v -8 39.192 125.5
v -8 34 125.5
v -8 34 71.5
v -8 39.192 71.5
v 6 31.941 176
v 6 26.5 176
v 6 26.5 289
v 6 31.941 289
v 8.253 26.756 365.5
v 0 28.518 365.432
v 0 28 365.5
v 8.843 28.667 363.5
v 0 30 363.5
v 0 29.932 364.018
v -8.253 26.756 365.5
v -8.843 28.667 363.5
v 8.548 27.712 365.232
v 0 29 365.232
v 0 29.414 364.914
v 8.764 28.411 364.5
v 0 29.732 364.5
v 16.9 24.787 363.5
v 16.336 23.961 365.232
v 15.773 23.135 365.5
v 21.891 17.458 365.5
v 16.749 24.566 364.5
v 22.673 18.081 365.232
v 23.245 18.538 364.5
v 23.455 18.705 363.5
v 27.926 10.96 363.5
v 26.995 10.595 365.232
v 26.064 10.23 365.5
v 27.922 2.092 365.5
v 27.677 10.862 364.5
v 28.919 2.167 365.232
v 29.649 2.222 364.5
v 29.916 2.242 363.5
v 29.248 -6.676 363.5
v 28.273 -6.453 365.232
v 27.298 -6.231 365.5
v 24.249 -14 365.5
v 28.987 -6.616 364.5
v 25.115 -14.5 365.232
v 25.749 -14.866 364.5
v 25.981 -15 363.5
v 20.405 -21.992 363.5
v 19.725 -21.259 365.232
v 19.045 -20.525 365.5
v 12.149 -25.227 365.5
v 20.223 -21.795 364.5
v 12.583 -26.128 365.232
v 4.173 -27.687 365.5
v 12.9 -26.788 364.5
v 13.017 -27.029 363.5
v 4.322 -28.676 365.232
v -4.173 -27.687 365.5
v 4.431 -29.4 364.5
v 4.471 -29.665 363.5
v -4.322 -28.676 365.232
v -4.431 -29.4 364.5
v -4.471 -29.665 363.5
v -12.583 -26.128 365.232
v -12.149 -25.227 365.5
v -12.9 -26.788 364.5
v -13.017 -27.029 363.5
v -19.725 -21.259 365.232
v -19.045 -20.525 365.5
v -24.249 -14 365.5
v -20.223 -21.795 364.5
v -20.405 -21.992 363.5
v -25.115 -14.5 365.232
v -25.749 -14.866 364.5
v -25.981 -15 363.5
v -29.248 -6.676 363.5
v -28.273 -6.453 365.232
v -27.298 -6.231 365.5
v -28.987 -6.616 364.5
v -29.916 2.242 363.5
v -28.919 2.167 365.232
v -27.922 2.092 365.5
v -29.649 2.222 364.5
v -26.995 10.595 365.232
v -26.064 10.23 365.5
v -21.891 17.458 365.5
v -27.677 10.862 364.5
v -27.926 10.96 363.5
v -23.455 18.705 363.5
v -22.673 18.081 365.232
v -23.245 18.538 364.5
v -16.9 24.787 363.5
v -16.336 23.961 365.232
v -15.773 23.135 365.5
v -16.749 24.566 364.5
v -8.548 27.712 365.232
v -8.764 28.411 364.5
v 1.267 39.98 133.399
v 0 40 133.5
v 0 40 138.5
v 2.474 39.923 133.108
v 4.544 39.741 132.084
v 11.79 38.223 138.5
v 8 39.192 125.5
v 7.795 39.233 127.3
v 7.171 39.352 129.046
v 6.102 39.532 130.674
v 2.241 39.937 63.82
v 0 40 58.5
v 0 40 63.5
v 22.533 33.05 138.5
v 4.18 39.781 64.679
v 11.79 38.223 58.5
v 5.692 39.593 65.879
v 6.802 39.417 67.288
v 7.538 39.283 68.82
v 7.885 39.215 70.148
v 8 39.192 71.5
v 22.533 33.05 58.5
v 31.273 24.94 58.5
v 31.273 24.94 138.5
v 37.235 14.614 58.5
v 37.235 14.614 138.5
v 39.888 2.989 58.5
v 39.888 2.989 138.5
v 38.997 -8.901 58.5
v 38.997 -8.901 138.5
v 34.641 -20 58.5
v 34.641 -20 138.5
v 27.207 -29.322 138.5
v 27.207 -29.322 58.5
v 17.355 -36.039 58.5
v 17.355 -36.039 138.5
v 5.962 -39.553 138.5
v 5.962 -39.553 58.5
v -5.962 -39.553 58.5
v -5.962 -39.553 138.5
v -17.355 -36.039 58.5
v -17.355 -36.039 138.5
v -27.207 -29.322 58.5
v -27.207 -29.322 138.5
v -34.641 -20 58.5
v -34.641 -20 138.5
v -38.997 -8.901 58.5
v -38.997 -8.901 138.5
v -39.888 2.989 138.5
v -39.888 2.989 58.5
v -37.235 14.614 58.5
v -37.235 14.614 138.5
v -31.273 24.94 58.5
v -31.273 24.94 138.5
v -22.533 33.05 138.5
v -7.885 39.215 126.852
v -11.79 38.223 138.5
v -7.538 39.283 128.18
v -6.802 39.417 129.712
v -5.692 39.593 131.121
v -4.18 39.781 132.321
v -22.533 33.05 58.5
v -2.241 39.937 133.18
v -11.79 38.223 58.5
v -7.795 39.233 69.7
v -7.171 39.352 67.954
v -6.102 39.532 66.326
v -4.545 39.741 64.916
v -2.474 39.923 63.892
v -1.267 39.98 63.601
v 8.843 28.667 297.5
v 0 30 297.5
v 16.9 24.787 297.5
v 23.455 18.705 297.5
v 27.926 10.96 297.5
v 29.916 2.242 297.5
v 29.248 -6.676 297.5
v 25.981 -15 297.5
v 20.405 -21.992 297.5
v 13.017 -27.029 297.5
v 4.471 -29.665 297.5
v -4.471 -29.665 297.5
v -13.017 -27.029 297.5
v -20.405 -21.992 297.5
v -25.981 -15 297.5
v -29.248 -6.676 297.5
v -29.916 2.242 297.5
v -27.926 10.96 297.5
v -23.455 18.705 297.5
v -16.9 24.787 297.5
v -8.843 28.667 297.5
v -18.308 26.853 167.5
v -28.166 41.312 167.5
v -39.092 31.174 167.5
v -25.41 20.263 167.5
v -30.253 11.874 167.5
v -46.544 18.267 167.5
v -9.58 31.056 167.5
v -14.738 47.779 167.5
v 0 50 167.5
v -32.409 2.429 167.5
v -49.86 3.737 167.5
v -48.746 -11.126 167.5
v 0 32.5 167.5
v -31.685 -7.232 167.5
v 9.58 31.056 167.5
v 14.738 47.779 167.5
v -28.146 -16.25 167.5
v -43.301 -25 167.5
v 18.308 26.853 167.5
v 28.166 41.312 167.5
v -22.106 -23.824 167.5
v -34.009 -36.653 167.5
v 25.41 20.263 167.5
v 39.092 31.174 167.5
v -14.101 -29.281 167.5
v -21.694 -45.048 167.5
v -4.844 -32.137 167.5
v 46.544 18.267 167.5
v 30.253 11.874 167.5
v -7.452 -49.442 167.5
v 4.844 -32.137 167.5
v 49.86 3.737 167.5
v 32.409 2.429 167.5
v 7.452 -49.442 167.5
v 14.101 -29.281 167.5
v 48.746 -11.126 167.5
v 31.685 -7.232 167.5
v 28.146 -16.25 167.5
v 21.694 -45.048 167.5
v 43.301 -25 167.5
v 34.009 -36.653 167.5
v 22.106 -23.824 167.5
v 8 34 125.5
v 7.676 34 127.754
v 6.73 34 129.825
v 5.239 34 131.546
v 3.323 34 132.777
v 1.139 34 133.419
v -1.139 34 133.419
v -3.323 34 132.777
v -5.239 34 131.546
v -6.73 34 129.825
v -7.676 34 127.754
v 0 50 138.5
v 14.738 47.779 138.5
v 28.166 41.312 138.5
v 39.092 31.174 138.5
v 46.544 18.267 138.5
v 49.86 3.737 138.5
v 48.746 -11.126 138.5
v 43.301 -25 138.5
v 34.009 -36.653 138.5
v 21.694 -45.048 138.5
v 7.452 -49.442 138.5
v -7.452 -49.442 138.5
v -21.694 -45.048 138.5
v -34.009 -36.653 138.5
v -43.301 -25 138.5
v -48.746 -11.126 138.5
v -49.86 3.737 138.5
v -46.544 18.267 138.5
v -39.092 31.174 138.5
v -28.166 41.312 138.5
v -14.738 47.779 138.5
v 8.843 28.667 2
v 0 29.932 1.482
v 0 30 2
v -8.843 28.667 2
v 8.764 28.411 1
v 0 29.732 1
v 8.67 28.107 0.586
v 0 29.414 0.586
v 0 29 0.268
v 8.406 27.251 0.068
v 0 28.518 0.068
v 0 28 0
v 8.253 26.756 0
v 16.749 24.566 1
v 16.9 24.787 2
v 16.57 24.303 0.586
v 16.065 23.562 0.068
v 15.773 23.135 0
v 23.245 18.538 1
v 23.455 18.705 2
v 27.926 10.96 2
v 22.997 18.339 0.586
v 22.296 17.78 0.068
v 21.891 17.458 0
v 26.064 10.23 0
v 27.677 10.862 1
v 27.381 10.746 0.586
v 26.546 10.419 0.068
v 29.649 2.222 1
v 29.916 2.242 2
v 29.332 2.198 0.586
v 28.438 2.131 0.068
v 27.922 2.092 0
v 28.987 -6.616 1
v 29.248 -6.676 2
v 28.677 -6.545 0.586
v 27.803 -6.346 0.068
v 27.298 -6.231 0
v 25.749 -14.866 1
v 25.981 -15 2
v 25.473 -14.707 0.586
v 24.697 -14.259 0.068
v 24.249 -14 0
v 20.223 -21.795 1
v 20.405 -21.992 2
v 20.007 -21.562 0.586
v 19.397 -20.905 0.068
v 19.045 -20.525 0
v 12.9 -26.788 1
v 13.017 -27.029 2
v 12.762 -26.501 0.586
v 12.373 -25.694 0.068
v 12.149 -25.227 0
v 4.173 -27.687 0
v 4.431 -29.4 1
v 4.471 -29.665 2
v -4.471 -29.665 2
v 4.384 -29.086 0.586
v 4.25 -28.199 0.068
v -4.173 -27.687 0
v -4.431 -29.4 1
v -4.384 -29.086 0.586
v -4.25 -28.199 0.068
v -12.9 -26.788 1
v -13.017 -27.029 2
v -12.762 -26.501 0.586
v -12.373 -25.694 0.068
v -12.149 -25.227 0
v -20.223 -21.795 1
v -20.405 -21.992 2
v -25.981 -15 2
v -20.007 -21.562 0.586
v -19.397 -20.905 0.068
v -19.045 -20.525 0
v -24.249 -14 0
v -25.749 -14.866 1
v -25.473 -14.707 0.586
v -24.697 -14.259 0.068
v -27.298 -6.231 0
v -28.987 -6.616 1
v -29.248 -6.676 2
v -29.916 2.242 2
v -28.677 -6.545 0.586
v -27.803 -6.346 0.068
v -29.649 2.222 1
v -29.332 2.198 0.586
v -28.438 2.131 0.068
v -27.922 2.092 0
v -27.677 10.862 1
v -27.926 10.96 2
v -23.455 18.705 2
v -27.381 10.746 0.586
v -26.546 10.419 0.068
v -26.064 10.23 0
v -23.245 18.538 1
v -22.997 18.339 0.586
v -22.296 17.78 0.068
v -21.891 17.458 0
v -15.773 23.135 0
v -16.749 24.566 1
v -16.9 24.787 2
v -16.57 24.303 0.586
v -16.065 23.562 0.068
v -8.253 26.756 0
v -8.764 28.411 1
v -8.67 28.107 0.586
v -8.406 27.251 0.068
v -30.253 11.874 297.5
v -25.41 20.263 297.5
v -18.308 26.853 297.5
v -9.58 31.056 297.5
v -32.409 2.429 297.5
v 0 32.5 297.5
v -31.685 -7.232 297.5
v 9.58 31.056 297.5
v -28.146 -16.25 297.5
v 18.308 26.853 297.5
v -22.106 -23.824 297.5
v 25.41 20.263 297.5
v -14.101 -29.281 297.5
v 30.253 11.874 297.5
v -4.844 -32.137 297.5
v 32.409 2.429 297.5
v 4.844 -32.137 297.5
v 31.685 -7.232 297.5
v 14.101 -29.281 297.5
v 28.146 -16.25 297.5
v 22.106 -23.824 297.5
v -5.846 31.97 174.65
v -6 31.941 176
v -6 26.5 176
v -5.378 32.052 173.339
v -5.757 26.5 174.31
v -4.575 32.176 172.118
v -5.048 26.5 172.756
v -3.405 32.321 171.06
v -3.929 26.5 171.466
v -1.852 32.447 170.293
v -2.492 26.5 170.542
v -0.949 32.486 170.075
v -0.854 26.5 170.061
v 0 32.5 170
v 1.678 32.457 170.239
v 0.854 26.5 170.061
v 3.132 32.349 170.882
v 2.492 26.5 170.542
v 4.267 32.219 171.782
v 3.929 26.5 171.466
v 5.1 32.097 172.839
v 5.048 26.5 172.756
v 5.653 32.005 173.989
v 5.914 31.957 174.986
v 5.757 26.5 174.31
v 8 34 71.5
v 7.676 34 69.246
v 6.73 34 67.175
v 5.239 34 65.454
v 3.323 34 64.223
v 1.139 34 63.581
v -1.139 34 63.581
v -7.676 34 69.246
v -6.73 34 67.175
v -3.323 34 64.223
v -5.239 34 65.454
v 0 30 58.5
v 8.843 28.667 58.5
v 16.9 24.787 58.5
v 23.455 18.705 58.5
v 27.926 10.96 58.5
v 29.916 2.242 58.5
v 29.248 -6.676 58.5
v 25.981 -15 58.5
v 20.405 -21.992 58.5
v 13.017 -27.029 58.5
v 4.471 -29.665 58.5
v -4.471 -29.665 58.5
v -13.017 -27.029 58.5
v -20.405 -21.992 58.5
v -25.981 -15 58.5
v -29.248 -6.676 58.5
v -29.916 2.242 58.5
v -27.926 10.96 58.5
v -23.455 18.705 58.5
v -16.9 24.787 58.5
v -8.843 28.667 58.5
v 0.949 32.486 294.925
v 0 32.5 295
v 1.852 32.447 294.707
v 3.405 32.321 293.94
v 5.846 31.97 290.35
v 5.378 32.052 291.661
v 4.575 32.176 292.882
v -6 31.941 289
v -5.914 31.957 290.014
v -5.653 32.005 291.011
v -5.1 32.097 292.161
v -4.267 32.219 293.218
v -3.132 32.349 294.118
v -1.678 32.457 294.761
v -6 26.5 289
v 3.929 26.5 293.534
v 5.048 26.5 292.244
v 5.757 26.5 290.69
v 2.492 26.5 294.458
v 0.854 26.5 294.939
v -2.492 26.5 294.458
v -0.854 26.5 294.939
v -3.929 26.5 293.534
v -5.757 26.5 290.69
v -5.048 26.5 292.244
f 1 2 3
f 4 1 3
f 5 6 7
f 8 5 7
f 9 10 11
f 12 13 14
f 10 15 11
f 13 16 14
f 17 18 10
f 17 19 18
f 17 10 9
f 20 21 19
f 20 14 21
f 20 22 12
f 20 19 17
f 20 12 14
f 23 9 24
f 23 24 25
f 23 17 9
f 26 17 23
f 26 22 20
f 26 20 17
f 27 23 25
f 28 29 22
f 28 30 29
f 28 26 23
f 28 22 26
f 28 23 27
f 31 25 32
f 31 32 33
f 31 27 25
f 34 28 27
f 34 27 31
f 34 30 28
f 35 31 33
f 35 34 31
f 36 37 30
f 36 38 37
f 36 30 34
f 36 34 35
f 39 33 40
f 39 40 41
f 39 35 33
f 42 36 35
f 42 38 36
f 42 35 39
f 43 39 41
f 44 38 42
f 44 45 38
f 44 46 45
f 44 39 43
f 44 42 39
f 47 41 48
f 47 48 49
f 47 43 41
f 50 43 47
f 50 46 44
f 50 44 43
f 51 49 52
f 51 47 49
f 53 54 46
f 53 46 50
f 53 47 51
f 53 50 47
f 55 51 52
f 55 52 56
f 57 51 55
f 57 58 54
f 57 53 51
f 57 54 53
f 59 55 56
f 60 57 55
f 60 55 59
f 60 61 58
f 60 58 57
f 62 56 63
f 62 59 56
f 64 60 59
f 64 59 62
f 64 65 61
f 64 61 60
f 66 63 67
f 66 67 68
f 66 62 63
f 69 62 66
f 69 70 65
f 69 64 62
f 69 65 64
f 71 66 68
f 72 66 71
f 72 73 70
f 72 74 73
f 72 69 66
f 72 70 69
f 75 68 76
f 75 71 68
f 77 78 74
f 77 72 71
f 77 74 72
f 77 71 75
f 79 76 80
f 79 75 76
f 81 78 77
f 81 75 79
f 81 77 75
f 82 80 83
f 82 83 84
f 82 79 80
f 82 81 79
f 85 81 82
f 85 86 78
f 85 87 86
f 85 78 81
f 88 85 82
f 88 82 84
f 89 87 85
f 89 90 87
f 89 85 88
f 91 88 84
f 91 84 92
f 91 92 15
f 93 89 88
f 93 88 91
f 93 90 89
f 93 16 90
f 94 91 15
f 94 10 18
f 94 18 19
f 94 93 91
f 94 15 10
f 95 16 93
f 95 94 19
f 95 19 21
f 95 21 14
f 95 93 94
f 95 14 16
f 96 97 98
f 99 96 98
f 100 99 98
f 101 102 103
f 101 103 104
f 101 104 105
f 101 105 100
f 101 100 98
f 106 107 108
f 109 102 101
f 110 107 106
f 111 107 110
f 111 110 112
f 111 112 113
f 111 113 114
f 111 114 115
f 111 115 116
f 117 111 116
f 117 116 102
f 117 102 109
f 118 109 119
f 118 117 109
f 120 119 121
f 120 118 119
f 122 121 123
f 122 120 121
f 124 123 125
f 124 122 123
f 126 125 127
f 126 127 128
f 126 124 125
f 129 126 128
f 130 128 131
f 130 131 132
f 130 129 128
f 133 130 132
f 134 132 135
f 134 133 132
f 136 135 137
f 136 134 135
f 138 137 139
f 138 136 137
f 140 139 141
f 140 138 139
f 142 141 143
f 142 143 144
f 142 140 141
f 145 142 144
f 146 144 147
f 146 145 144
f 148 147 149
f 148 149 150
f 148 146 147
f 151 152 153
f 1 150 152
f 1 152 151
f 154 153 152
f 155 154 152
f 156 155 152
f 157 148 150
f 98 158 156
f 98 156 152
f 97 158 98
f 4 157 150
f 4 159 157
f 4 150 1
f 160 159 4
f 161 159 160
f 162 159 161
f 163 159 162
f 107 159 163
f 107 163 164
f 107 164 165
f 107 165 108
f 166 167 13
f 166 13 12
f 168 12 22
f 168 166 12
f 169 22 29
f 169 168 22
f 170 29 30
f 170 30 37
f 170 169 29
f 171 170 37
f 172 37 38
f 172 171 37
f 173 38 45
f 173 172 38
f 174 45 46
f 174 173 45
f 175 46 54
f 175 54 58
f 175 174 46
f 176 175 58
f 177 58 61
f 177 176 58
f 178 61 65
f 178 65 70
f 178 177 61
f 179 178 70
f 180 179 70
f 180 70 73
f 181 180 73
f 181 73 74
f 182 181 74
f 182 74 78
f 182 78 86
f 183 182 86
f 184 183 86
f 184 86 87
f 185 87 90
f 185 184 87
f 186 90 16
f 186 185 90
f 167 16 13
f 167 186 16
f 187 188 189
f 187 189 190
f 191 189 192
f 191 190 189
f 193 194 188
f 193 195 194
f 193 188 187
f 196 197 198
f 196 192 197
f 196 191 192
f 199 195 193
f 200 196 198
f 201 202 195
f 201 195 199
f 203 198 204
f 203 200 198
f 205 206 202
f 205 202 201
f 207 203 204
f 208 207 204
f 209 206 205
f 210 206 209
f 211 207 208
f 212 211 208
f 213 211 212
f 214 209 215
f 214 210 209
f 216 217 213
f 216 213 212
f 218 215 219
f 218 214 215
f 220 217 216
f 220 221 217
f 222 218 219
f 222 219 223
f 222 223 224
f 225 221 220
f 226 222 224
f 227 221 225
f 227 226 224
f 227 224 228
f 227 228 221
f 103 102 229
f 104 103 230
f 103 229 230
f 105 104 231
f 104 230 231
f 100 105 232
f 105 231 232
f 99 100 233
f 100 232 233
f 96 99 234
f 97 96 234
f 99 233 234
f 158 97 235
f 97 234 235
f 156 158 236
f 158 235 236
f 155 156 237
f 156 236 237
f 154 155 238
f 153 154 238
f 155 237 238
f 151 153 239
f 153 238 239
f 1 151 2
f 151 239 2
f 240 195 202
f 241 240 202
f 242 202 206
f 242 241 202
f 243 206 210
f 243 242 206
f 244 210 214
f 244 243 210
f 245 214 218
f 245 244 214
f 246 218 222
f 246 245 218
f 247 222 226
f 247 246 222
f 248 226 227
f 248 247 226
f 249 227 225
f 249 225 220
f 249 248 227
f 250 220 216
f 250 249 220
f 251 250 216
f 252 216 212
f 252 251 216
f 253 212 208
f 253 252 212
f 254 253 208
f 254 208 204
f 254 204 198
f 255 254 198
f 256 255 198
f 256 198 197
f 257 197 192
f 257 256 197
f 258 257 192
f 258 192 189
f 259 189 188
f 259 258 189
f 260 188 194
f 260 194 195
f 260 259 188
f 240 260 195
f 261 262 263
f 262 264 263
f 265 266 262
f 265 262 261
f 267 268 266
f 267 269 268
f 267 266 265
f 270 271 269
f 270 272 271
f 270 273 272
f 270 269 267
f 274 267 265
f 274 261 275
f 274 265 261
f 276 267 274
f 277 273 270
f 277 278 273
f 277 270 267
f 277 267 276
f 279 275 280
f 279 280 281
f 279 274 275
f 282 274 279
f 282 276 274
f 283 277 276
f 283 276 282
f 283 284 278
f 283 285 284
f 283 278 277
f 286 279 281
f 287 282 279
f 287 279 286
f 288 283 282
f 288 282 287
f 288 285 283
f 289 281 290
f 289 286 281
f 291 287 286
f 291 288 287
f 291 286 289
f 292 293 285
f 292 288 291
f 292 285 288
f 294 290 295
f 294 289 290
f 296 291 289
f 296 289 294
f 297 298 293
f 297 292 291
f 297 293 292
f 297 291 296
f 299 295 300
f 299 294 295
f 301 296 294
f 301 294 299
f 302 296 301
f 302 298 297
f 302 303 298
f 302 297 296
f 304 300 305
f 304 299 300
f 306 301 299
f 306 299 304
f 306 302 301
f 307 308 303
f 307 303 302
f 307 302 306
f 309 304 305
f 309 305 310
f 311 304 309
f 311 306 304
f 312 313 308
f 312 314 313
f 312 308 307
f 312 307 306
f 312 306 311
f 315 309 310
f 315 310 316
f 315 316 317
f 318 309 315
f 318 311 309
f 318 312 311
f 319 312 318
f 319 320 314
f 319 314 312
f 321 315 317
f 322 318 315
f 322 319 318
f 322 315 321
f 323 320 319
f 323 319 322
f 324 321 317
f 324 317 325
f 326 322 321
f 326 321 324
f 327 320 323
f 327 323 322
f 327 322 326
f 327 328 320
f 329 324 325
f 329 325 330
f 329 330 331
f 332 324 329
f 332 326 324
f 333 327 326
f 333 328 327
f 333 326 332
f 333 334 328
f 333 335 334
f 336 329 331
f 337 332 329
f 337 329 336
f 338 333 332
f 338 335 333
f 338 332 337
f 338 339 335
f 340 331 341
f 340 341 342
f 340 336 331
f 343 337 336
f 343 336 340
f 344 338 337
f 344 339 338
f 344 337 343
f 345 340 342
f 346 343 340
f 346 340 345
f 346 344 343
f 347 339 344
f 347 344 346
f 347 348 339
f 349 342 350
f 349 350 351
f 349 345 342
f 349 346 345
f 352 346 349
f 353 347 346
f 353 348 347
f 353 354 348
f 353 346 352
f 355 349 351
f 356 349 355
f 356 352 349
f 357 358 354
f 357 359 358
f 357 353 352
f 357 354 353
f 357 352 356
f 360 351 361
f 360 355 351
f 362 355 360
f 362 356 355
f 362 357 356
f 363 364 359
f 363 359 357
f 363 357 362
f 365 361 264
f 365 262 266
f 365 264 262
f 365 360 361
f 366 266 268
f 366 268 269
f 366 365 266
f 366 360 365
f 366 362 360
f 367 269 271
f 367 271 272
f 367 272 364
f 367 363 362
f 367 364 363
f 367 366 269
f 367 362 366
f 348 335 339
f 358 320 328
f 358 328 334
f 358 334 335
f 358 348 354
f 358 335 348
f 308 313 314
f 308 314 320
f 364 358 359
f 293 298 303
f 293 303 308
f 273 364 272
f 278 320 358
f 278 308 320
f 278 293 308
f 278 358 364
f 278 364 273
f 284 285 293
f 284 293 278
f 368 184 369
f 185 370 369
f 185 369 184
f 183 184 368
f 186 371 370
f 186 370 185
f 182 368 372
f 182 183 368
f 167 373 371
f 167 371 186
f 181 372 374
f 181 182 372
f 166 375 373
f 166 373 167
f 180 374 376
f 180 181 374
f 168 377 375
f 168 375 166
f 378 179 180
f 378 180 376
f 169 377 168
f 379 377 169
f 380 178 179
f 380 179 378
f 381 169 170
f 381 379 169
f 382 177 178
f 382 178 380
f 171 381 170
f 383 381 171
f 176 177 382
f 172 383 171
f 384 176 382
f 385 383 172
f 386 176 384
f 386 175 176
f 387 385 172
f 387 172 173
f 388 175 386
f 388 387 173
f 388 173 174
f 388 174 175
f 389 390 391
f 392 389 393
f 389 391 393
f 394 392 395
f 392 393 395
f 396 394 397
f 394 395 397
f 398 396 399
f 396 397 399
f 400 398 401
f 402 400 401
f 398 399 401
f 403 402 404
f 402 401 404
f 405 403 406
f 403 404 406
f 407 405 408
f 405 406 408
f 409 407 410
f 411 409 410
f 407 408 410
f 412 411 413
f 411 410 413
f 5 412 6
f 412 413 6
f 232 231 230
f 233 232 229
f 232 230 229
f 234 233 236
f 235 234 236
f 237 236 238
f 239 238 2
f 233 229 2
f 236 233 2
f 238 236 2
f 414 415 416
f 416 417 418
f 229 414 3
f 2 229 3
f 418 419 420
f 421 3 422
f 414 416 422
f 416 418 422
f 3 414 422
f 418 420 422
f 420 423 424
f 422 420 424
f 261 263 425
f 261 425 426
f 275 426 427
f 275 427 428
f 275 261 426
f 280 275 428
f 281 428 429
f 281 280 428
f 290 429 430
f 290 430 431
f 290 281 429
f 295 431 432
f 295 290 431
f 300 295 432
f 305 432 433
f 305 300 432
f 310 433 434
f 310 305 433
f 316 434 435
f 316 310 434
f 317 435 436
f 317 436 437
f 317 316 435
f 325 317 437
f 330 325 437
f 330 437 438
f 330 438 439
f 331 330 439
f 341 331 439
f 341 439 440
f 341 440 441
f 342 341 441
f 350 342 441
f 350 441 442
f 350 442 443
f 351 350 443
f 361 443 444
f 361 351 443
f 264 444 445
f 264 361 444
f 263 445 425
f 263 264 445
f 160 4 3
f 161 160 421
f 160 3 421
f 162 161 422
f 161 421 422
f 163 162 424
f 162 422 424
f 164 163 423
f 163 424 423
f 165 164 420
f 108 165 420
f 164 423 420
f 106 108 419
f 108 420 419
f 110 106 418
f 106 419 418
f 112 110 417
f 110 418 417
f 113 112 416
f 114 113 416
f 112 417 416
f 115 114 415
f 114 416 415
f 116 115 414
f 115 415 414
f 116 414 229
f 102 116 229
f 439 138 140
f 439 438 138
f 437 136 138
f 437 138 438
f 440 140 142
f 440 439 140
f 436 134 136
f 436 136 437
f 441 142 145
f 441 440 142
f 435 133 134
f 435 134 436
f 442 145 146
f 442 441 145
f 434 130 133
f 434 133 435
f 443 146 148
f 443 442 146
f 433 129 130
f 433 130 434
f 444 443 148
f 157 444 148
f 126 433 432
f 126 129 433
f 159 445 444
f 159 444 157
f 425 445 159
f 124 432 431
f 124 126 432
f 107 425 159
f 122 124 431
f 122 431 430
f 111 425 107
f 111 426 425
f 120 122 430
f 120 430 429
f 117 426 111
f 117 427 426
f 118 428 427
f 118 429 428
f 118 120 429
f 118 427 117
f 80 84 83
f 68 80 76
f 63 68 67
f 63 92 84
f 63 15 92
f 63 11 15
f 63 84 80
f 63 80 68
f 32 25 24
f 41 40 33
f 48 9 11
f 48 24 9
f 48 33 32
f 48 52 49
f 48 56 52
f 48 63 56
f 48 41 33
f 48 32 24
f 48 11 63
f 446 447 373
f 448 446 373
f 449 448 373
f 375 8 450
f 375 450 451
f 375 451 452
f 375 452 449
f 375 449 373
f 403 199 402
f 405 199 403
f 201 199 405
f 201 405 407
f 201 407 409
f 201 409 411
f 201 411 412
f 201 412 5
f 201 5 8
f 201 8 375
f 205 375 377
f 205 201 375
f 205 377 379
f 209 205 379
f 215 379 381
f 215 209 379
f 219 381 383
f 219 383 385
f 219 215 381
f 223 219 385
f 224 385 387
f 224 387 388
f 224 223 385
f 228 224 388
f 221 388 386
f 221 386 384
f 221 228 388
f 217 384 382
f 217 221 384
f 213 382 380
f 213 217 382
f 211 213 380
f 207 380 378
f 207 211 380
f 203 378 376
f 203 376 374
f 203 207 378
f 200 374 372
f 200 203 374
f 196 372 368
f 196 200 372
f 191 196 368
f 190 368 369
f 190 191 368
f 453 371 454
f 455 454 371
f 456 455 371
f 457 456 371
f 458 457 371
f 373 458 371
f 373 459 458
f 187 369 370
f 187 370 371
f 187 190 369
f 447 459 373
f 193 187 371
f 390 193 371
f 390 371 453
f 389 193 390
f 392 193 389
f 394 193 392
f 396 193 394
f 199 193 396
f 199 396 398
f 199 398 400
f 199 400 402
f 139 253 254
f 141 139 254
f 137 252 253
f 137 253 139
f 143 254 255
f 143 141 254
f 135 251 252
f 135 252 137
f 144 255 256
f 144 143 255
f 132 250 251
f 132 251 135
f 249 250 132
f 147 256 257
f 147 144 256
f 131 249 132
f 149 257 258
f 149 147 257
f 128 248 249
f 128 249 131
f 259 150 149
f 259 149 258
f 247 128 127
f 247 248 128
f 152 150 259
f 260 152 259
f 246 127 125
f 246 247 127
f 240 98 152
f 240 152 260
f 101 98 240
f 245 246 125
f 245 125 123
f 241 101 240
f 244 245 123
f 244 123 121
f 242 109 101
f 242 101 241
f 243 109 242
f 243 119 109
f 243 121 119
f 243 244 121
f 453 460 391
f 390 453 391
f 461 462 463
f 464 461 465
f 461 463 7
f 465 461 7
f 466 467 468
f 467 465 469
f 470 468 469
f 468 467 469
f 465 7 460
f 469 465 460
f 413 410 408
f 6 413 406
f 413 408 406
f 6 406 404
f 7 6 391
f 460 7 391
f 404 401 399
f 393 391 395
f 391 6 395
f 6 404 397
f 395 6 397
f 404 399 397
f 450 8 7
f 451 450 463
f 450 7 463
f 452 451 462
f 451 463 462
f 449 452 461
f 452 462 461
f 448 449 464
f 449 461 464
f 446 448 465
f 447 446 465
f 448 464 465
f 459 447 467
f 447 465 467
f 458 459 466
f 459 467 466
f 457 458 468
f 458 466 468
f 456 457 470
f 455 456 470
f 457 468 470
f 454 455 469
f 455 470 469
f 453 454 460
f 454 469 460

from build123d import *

# Parameters (mm, degrees)
FILLET1_R          = 2
CUT_EXTRUDE1_START = 34
CUT_EXTRUDE1_DEPTH = 10
CUT_EXTRUDE2_START = 26.5
CUT_EXTRUDE2_DEPTH = 10


with BuildPart() as part:
    # Sketch1 → Revolve1 (revolve)
    with BuildSketch(Plane(origin=(0, 0, 0), x_dir=(0, 0, -1), z_dir=(1, 0, 0))):
        Polygon((0, 0), (-365.5, 0), (-365.5, 30), (-297.5, 30), (-297.5, 32.5), (-167.5, 32.5), (-167.5, 50), (-138.5, 50), (-138.5, 40), (-58.5, 40), (-58.5, 30), (0, 30), align=None)
    revolve(axis=Axis((0, 0, 0), (0, 0, -1)))

    # Fillet1
    fillet1_edges = [part.edges().sort_by_distance(p)[0] for p in [
        (0, -30, 365.5),
        (0, -30, 0),
    ]]
    fillet(fillet1_edges, radius=FILLET1_R)

    # Sketch2 → Cut-Extrude1 (cut)
    with BuildSketch(Plane(origin=(0, 0, 0), x_dir=(1, 0, 0), z_dir=(0, 1, 0)).offset(CUT_EXTRUDE1_START)):
        with BuildLine():
            Line((8, -71.5), (8, -125.5))
            ThreePointArc((8, -125.5), (0, -133.5), (-8, -125.5))
            Line((-8, -125.5), (-8, -71.5))
            ThreePointArc((-8, -71.5), (0, -63.5), (8, -71.5))
        make_face()
    extrude(amount=CUT_EXTRUDE1_DEPTH, mode=Mode.SUBTRACT)

    # Sketch3 → Cut-Extrude2 (cut)
    with BuildSketch(Plane(origin=(0, 0, 0), x_dir=(1, 0, 0), z_dir=(0, 1, 0)).offset(CUT_EXTRUDE2_START)):
        with BuildLine():
            Line((6, -176), (6, -289))
            ThreePointArc((6, -289), (0, -295), (-6, -289))
            Line((-6, -289), (-6, -176))
            ThreePointArc((-6, -176), (0, -170), (6, -176))
        make_face()
    extrude(amount=CUT_EXTRUDE2_DEPTH, mode=Mode.SUBTRACT)


solid = part.part
